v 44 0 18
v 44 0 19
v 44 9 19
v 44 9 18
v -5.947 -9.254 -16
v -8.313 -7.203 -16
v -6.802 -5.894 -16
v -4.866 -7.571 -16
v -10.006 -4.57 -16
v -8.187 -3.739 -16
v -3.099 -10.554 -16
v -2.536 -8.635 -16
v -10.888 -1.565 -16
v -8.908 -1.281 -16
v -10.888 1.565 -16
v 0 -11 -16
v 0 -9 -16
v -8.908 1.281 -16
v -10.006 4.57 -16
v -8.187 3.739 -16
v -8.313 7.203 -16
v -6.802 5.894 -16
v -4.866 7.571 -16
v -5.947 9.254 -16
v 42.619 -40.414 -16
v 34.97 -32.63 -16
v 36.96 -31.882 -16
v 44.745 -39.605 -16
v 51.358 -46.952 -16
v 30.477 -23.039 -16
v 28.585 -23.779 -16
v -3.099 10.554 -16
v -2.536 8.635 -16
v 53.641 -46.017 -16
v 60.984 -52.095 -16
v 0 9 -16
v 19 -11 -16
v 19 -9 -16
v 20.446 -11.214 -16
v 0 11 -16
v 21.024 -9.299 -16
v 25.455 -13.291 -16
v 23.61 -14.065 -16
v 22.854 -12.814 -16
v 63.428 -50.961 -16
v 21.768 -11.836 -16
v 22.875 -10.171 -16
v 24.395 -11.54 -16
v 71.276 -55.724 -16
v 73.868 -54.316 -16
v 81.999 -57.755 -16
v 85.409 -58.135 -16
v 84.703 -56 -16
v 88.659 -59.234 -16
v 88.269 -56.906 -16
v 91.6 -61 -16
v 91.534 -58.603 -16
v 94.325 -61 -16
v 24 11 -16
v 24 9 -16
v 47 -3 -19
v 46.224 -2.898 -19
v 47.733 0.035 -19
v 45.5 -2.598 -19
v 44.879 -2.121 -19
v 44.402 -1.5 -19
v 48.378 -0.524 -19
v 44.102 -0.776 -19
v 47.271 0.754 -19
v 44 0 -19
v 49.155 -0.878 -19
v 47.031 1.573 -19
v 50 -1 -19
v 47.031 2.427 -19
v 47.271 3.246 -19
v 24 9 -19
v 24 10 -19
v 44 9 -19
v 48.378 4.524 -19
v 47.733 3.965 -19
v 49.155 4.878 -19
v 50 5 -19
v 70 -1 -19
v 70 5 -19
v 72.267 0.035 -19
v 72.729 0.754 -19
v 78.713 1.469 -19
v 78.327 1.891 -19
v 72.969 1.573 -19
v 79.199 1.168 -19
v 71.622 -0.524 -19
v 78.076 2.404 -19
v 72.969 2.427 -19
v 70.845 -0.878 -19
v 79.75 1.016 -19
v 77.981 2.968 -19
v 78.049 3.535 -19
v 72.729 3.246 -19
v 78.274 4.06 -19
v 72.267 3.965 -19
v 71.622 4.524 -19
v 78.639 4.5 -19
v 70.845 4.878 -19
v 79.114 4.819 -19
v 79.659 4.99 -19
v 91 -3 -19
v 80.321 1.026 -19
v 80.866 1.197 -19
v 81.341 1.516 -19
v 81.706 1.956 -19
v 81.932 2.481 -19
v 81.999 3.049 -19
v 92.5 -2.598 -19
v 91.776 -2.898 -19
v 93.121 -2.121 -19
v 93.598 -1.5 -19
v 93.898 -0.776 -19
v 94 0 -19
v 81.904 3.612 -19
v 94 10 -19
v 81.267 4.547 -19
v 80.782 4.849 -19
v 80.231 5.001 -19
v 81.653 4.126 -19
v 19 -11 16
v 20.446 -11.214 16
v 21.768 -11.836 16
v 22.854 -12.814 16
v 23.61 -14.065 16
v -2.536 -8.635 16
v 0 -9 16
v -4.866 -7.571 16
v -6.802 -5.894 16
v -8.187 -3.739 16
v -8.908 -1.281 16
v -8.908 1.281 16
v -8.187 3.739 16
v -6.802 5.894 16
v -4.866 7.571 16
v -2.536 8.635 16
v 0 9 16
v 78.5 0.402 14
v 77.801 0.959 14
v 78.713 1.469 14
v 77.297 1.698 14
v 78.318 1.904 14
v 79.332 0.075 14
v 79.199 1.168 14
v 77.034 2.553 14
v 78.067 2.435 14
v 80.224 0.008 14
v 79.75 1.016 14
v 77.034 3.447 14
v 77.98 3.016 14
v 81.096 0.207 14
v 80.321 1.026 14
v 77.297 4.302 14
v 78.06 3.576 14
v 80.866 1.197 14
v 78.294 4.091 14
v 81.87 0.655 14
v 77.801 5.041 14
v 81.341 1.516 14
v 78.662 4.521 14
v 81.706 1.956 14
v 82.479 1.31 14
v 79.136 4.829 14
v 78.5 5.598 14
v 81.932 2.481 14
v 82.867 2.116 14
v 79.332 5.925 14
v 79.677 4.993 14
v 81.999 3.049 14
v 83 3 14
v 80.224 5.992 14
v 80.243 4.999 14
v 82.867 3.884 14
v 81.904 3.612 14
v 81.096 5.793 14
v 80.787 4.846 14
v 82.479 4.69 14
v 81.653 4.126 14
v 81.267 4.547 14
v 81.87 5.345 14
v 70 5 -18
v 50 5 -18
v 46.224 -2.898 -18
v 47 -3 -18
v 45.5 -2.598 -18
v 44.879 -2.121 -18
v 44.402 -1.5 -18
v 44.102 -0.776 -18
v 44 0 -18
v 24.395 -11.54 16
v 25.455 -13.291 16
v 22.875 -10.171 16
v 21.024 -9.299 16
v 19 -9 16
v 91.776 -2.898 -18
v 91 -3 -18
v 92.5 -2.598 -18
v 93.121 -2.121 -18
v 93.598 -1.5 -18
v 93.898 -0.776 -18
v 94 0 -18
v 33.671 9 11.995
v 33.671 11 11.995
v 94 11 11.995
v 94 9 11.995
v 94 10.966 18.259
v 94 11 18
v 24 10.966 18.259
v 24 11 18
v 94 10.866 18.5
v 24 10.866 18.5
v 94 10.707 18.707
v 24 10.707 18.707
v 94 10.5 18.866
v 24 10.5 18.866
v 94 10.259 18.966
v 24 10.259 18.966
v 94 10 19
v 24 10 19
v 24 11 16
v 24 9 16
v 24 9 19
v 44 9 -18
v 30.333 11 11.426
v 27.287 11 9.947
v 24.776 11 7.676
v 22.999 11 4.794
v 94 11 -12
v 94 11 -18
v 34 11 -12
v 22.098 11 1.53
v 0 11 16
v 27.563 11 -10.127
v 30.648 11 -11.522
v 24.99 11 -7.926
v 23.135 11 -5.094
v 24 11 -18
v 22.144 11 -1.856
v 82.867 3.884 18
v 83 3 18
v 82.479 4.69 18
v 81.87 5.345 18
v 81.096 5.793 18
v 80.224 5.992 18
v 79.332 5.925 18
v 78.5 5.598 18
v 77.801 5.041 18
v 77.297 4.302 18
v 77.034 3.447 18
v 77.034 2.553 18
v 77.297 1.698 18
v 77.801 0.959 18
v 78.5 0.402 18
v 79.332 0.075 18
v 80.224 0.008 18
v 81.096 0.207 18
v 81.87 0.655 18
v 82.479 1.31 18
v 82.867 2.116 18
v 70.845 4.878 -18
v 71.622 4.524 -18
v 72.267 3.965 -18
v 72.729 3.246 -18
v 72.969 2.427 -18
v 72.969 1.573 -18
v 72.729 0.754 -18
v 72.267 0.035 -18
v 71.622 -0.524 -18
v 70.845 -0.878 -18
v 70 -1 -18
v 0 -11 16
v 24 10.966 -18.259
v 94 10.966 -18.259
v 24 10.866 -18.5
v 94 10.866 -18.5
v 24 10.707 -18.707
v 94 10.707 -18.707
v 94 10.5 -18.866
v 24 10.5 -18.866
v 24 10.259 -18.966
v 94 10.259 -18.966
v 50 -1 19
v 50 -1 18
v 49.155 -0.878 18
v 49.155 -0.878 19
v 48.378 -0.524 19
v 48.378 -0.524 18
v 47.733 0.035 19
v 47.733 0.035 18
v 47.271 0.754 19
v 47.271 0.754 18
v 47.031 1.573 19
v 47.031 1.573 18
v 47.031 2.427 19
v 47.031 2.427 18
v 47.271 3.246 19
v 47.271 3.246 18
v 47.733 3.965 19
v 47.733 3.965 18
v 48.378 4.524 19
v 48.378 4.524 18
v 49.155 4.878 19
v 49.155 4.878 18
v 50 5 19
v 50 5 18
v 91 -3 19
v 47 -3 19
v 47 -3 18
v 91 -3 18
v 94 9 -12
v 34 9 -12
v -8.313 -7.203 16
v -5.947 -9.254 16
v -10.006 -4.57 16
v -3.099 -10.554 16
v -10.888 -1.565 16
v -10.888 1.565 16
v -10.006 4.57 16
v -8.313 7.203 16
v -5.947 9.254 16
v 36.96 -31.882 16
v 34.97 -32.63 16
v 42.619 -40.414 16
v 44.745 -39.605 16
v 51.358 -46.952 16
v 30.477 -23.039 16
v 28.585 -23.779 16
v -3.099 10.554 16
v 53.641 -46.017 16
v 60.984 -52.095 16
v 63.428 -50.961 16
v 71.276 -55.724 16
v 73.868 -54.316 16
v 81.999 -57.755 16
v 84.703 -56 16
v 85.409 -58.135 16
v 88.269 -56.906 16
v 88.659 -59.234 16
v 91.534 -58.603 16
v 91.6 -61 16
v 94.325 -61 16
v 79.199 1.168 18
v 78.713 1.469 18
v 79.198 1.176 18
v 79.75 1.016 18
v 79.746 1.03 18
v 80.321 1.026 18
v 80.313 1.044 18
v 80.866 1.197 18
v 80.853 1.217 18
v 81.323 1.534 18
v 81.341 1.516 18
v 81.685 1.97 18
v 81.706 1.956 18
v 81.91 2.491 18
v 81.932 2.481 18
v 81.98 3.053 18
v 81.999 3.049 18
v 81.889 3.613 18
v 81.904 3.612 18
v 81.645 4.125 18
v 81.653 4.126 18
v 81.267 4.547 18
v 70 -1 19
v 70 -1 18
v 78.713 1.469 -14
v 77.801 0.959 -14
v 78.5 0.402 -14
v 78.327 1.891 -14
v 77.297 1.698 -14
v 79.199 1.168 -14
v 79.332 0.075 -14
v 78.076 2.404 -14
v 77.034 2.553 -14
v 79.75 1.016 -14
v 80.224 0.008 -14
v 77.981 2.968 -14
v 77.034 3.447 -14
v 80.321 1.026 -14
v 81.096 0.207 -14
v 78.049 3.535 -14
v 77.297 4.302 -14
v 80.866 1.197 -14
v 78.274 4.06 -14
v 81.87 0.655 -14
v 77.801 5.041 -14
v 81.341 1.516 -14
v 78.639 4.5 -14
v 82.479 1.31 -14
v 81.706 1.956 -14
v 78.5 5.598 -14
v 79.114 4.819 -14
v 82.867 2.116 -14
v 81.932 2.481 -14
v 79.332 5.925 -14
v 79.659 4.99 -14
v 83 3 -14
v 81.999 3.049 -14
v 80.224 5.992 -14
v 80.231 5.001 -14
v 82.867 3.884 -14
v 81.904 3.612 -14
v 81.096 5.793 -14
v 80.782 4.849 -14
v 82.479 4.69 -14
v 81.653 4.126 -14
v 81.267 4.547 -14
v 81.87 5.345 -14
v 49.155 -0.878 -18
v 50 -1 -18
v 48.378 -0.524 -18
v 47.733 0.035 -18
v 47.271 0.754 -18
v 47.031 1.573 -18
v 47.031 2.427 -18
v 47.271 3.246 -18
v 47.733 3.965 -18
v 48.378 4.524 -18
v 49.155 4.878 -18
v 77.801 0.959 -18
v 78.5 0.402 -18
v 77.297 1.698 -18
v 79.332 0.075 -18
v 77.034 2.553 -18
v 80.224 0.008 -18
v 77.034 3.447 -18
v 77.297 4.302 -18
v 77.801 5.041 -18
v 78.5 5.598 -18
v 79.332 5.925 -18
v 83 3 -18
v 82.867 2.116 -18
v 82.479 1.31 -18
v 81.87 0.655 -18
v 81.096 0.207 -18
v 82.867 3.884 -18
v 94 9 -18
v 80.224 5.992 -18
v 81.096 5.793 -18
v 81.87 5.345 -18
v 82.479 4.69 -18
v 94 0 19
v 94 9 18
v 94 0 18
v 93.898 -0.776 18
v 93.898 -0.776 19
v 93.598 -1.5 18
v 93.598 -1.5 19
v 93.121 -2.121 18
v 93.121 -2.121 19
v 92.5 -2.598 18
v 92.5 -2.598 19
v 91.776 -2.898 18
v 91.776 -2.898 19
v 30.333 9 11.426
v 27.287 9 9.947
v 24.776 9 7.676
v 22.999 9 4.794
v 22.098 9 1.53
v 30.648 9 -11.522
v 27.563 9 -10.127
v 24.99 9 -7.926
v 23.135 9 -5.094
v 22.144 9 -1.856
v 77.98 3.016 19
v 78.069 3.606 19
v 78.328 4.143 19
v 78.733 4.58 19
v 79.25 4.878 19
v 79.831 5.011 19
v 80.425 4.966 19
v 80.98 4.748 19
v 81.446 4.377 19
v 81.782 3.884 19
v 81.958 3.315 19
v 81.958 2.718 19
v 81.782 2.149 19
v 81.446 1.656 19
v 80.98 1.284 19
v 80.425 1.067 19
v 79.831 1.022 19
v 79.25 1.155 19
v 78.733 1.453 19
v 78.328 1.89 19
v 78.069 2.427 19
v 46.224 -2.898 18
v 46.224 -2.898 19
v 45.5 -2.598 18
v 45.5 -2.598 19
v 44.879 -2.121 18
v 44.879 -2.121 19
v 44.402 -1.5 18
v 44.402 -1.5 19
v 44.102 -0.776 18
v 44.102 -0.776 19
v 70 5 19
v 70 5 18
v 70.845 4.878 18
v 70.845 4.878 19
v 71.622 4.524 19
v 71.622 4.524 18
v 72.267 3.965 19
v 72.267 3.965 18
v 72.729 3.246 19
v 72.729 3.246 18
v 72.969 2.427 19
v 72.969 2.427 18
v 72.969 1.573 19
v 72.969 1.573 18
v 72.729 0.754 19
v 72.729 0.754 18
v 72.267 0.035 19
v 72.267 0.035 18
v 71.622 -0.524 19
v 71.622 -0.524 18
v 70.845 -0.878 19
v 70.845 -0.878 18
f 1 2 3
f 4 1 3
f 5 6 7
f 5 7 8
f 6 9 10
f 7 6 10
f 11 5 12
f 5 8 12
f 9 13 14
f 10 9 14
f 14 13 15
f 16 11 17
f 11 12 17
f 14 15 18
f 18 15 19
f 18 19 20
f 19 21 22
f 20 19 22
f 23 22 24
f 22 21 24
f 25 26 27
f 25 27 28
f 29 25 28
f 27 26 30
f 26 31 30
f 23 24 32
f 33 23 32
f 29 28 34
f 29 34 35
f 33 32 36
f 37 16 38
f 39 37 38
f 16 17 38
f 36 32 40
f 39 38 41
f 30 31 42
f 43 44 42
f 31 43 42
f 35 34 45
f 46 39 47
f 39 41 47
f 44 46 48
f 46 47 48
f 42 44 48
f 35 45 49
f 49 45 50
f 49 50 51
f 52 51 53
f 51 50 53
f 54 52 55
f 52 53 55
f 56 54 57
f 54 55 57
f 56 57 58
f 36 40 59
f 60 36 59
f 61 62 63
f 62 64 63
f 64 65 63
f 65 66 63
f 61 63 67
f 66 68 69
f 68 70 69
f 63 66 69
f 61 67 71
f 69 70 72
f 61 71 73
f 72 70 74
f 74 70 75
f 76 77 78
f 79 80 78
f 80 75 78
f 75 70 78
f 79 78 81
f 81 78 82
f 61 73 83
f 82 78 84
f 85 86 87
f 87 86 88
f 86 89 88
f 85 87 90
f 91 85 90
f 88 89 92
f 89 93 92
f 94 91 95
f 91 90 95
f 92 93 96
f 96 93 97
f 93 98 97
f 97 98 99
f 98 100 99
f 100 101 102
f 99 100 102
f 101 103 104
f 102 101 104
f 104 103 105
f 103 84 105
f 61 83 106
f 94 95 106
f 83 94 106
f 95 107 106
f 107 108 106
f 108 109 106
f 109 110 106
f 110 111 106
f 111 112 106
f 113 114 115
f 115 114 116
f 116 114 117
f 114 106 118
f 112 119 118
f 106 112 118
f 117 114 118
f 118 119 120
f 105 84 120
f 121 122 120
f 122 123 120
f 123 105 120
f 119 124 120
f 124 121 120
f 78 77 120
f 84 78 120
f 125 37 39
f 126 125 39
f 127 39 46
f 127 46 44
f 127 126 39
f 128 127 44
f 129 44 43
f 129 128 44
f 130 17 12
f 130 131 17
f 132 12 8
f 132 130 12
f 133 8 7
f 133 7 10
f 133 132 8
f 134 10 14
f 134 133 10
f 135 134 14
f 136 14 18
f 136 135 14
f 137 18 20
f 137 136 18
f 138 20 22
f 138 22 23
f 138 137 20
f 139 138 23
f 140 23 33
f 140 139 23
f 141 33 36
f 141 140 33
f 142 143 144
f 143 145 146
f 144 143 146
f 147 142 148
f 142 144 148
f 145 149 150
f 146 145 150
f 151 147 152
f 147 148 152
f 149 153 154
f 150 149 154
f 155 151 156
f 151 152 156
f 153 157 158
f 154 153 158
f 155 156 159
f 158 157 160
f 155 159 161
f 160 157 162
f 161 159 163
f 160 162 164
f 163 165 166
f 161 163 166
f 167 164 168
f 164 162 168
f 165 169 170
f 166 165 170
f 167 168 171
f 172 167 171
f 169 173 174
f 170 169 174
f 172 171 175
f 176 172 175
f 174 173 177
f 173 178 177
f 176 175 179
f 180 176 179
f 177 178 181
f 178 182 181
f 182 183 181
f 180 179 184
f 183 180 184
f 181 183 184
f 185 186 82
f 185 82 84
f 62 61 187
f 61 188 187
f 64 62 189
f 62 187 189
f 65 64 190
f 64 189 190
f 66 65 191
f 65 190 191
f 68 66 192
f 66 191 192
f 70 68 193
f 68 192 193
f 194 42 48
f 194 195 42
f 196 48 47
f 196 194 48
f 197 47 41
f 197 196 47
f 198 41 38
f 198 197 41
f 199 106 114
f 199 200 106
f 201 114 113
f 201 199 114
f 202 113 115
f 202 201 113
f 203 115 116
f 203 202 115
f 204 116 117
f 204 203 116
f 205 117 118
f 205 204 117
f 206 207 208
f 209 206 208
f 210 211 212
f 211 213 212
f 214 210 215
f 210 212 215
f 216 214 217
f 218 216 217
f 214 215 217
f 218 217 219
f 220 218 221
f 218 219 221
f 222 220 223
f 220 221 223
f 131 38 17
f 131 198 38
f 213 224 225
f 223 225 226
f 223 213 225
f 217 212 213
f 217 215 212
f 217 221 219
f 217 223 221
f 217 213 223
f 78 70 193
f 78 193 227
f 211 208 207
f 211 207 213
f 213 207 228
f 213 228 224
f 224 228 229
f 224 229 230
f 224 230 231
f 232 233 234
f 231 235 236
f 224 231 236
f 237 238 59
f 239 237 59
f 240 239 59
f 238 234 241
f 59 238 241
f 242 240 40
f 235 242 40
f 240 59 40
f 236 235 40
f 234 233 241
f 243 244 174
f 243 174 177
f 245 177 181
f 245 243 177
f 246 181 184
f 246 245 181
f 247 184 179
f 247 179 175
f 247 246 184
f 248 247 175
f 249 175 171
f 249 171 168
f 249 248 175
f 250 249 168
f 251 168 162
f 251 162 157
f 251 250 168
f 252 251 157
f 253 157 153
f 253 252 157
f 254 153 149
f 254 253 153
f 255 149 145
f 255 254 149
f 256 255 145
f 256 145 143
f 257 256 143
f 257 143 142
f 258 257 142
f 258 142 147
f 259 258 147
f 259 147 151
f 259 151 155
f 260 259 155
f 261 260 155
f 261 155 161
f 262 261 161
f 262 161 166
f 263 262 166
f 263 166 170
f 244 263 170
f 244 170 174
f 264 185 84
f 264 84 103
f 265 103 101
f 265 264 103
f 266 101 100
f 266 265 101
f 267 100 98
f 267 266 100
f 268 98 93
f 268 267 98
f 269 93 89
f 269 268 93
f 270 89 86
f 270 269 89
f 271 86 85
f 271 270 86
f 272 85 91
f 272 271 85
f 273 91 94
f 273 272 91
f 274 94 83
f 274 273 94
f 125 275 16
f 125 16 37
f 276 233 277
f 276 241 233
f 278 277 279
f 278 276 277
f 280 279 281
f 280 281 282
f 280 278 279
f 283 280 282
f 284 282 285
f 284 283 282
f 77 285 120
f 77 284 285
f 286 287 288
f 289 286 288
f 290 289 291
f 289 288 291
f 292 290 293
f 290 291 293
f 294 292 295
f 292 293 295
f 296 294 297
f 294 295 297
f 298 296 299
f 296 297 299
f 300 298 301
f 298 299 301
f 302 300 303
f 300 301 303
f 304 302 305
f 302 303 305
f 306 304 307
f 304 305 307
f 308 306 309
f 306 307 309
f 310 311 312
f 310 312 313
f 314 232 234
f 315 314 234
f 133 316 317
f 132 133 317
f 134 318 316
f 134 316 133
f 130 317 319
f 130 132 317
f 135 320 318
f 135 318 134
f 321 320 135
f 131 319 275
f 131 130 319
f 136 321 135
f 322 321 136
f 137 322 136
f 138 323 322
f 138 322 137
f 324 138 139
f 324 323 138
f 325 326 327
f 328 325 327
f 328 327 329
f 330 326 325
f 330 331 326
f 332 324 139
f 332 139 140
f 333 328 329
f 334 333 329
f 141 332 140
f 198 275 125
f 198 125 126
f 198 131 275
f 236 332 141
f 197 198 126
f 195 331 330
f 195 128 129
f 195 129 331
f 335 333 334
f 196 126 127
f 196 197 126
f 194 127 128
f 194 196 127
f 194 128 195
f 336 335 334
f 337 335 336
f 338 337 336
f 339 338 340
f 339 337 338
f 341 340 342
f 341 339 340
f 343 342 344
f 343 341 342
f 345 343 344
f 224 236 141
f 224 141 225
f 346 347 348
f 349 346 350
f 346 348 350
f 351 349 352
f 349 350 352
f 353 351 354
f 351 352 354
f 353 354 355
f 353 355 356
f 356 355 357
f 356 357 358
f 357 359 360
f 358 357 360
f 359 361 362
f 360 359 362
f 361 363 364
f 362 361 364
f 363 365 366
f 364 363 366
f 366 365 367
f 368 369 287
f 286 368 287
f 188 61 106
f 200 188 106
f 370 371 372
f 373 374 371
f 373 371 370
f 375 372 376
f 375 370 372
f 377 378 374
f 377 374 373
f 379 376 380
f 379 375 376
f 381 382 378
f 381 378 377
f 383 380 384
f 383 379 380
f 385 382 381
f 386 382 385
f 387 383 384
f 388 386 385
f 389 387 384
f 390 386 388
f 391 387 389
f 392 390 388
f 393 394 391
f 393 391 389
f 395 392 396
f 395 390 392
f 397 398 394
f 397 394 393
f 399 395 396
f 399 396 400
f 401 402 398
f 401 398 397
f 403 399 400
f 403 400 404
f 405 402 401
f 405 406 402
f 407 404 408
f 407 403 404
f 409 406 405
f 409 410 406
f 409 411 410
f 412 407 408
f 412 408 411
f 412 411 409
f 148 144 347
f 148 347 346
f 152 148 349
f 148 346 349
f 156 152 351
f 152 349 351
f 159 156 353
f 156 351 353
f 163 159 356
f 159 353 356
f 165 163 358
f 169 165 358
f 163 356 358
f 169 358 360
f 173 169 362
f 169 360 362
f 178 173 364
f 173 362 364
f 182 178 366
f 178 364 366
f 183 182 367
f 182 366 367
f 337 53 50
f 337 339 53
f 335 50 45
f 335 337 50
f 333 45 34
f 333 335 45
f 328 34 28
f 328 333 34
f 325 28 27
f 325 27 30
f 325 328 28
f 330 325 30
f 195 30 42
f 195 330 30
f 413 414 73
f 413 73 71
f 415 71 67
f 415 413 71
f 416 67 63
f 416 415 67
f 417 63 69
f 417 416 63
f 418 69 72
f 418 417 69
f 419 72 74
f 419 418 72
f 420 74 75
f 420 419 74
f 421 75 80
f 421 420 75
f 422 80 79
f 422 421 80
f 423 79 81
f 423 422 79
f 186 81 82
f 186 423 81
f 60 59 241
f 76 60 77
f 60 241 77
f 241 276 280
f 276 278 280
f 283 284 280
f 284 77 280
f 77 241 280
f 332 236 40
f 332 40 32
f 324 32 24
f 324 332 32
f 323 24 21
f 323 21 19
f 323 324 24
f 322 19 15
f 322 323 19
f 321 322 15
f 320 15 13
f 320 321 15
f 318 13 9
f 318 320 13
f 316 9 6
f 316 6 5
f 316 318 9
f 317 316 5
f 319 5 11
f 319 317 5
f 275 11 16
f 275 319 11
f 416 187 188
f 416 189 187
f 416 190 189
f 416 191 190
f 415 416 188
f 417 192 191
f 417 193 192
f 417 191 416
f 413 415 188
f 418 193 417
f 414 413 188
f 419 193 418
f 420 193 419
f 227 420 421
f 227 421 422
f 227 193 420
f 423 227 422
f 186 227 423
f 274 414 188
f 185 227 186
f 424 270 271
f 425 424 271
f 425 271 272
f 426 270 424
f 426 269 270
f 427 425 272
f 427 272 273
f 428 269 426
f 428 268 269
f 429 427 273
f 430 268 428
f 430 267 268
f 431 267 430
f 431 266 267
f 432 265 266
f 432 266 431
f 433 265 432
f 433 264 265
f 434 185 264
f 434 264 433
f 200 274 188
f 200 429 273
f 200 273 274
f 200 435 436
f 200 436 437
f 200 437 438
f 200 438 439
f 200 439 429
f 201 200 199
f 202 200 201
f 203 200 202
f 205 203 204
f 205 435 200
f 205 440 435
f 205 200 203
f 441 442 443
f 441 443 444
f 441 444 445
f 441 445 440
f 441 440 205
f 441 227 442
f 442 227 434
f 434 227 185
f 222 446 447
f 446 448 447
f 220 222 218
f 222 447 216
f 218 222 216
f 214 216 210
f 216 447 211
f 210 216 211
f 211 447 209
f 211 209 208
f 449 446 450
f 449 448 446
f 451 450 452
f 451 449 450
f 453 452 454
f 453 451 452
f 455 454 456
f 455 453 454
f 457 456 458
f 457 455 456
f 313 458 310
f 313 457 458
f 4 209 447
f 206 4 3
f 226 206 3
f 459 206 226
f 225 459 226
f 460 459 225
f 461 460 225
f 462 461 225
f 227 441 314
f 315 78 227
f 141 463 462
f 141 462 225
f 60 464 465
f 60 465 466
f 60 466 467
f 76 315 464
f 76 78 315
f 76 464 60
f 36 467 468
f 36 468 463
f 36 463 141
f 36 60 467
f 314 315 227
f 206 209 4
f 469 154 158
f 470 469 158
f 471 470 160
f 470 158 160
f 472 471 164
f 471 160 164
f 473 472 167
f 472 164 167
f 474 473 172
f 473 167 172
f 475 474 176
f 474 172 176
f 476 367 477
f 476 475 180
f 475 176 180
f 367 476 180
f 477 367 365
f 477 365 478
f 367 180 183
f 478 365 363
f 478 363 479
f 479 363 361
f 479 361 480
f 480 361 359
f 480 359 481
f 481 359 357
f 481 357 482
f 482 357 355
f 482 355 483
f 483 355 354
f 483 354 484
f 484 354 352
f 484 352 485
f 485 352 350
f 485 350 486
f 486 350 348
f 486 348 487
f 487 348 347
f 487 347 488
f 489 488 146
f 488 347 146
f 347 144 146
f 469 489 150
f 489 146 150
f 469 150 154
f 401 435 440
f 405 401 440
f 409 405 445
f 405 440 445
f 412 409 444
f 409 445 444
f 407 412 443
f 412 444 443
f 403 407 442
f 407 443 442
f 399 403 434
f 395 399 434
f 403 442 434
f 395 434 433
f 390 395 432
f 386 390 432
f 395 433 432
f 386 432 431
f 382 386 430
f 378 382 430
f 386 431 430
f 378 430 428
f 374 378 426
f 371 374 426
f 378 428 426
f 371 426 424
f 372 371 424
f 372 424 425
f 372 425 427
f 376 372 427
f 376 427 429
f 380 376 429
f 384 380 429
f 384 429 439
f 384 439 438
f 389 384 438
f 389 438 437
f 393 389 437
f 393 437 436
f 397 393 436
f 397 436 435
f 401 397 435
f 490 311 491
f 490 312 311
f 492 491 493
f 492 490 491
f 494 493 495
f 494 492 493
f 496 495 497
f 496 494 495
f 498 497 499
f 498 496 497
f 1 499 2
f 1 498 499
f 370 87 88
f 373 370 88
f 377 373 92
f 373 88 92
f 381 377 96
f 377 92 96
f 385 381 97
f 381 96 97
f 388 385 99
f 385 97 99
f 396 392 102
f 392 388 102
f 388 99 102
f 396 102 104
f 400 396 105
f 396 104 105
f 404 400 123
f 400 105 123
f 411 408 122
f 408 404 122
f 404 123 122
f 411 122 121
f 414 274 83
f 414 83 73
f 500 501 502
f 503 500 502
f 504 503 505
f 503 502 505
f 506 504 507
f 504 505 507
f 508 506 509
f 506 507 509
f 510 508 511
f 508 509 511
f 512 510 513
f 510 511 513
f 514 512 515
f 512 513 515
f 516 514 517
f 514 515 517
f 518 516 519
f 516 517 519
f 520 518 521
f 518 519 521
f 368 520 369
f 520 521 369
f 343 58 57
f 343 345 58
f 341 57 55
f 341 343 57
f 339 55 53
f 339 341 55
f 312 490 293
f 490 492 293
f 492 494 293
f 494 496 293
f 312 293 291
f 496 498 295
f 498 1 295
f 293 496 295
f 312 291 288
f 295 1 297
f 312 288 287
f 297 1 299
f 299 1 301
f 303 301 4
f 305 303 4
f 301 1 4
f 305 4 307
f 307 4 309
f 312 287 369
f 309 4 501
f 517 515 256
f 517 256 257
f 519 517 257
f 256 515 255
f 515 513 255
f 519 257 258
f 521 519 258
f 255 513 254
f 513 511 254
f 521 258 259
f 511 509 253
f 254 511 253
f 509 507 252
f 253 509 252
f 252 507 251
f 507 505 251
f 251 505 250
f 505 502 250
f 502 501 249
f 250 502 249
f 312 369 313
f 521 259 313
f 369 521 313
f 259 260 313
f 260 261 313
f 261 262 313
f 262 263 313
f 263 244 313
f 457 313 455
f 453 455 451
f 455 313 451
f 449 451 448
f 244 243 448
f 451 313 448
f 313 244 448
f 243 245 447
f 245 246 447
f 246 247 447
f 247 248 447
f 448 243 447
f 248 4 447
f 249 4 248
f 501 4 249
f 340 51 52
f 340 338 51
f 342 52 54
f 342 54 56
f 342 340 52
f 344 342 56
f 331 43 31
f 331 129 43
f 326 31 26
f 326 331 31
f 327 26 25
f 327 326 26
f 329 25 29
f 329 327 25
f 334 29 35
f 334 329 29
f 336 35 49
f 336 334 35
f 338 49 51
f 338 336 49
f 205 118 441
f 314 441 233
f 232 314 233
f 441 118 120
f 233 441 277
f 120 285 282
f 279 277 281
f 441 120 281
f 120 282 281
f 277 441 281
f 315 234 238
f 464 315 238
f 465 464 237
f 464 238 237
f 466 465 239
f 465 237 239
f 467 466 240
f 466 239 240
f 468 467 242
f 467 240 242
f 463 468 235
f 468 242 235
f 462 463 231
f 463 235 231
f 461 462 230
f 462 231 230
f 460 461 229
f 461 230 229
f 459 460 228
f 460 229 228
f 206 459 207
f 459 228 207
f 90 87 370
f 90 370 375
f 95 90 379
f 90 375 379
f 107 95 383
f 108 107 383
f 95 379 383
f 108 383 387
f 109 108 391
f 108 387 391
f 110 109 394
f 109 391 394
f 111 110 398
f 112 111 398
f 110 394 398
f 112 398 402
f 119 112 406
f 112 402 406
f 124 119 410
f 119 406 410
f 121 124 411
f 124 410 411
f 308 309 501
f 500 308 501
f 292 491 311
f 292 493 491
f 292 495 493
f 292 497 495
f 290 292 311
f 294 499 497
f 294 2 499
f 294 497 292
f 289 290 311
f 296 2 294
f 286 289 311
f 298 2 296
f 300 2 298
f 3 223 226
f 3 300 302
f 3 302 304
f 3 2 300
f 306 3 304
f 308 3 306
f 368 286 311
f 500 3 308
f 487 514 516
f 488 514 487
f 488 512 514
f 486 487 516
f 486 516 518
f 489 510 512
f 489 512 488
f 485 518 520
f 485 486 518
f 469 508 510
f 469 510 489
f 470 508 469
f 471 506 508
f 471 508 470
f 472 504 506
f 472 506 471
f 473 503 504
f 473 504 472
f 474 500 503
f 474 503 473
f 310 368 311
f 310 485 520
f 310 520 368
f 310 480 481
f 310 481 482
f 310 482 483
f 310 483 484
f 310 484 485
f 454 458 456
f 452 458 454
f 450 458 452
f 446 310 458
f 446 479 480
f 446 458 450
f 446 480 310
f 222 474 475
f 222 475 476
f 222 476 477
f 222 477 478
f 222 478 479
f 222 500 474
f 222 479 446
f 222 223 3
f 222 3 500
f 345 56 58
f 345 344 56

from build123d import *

# Parameters (mm, degrees)
F1_DEPTH  = 16
F2_W      = 70
F2_H      = 3
F3_DEPTH  = 2
F4_W      = 50
F4_H      = 14
F5_DEPTH  = 1
F6_R      = 1
F9_DEPTH  = 2
F11_DEPTH = 1.001
F13_D     = 4
F13_DEPTH = 50
F13_TIP   = 1.2017212381
F14_R     = 3
F14_R_2   = 2
F15_DEPTH = 5
F16_R     = 3
F18_D     = 4
F18_DEPTH = 50
F18_TIP   = 1.2017212381


# Not quite as in the source:
# - a pattern or mirror of a feature is missing from the dataset's text; its kind, count and spacing are read off the source's solid


with BuildPart() as f1:
    # F0 (on Top) → F1 (new body)
    with BuildSketch(Plane.XY):
        with BuildLine():
            Line((94, 11), (0, 11))
            ThreePointArc((0, 11), (-11, 0), (0, -11))
            Line((0, -11), (19, -11))
            ThreePointArc((19, -11), (21.7681124643, -11.8361612201), (23.6103896104, -14.064978646))
            ThreePointArc((23.6103896104, -14.064978646), (46.8644288503, -43.8489365308), (81.9993431207, -57.7547729841))
            ThreePointArc((81.9993431207, -57.7547729841), (87.0632727772, -58.5972193444), (91.5997631119, -61))
            Line((91.5997631119, -61), (94.3248553538, -61))
            ThreePointArc((94.3248553538, -61), (89.9506080698, -57.6601123846), (84.7034264019, -56))
            ThreePointArc((84.7034264019, -56), (49.0672193413, -42.9854179344), (25.4545454545, -13.2909701044))
            ThreePointArc((25.4545454545, -13.2909701044), (22.87535745, -10.1706257081), (19, -9))
            Line((19, -9), (0, -9))
            ThreePointArc((0, -9), (-9, 0), (0, 9))
            Line((0, 9), (94, 9))
            Line((94, 9), (94, 11))
        make_face()
    extrude(amount=F1_DEPTH)

    # F2 (on face) → F3 (join)
    with BuildSketch(Plane(origin=(0, 11, 0), x_dir=(-1, 0, 0), z_dir=(0, 1, 0))):
        with Locations((-59, 17.5)):
            Rectangle(F2_W, F2_H)
    extrude(amount=-F3_DEPTH)

    # F4 (on face) → F5 (join)
    with BuildSketch(Plane.XY.offset(19)):
        with Locations((69, 4)):
            Rectangle(F4_W, F4_H)
    extrude(amount=-F5_DEPTH)

    # F6
    f6_edges = [f1.edges().sort_by_distance(p)[0] for p in [
        (59, 11, 19),
    ]]
    fillet(f6_edges, radius=F6_R)

    # F7: F1 across face


with BuildPart() as f1_1:
    add(f1.part)
    add(f1.part.mirror(Plane(origin=(39.0198924269, -12.8147332924, 0), x_dir=(1, 0, 0), z_dir=(0, 0, -1))))

    # F8 (on face) → F9 (cut)
    with BuildSketch(Plane(origin=(0, 11, 0), x_dir=(-1, 0, 0), z_dir=(0, 1, 0))):
        with BuildLine():
            Line((-94, -12), (-34, -12))
            ThreePointArc((-34, -12), (-22.001130085, -0.1646838272), (-33.6706633635, 11.9954798728))
            Line((-33.6706633635, 11.9954798728), (-34.3293366365, 11.9954798728))
            Line((-34.3293366365, 11.9954798728), (-94, 11.9954798728))
            Line((-94, 11.9954798728), (-94, -12))
        make_face()
    extrude(amount=-F9_DEPTH, mode=Mode.SUBTRACT)

    # F10 (on face) → F11 (cut, through all)
    with BuildSketch(Plane(origin=(0, 0, 18), x_dir=(1, 0, 0), z_dir=(0, 0, -1))):
        with BuildLine():
            ThreePointArc((50, 1), (47, -2), (50, -5))
            Line((50, -5), (70, -5))
            ThreePointArc((70, -5), (73, -2), (70, 1))
            Line((70, 1), (50, 1))
        make_face()
    f11 = extrude(amount=-F11_DEPTH, mode=Mode.SUBTRACT)

    # F11_copies: F11 across plane
    add(f11.mirror(Plane(origin=(0, 0, 0), x_dir=(-1, 0, 0), z_dir=(0, 0, -1))), mode=Mode.SUBTRACT)

    # F13 (one way)
    with BuildSketch(Plane.XY.offset(18)):
        with Locations((80, 3)):
            Circle(F13_D / 2)
    extrude(amount=-F13_DEPTH, mode=Mode.SUBTRACT)
    with Locations(Plane.XY.offset(18)):
        with Locations((80, 3)):
            with Locations((0, 0, -(F13_DEPTH + F13_TIP / 2))):  # 118° drill point
                Cone(0, F13_D / 2, F13_TIP, mode=Mode.SUBTRACT)

    # F14 (on face) → F15 (join)
    with BuildSketch(Plane.XY.offset(19)):
        with Locations((80, 3)):
            Circle(F14_R)
        with Locations((80, 3)):
            Circle(F14_R_2, mode=Mode.SUBTRACT)
    f15 = extrude(amount=-F15_DEPTH)

    # F15_copies: F15 across plane
    add(f15.mirror(Plane(origin=(0, 0, 0), x_dir=(-1, 0, 0), z_dir=(0, 0, -1))))

    # F16
    f16_edges = [f1_1.edges().sort_by_distance(p)[0] for p in [
        (94, -3, 18.5),
        (44, -3, 18.5),
        (44, -3, -18.5),
        (94, -3, -18.5),
    ]]
    fillet(f16_edges, radius=F16_R)

    # F18
    with Locations(Plane.XY.offset(19)):
        with Locations((79.9801871181, 3.0164394993)):
            Hole(F18_D / 2, depth=F18_DEPTH)
            with Locations((0, 0, -(F18_DEPTH + F18_TIP / 2))):  # 118° drill point
                Cone(0, F18_D / 2, F18_TIP, mode=Mode.SUBTRACT)


solid = f1_1.part
